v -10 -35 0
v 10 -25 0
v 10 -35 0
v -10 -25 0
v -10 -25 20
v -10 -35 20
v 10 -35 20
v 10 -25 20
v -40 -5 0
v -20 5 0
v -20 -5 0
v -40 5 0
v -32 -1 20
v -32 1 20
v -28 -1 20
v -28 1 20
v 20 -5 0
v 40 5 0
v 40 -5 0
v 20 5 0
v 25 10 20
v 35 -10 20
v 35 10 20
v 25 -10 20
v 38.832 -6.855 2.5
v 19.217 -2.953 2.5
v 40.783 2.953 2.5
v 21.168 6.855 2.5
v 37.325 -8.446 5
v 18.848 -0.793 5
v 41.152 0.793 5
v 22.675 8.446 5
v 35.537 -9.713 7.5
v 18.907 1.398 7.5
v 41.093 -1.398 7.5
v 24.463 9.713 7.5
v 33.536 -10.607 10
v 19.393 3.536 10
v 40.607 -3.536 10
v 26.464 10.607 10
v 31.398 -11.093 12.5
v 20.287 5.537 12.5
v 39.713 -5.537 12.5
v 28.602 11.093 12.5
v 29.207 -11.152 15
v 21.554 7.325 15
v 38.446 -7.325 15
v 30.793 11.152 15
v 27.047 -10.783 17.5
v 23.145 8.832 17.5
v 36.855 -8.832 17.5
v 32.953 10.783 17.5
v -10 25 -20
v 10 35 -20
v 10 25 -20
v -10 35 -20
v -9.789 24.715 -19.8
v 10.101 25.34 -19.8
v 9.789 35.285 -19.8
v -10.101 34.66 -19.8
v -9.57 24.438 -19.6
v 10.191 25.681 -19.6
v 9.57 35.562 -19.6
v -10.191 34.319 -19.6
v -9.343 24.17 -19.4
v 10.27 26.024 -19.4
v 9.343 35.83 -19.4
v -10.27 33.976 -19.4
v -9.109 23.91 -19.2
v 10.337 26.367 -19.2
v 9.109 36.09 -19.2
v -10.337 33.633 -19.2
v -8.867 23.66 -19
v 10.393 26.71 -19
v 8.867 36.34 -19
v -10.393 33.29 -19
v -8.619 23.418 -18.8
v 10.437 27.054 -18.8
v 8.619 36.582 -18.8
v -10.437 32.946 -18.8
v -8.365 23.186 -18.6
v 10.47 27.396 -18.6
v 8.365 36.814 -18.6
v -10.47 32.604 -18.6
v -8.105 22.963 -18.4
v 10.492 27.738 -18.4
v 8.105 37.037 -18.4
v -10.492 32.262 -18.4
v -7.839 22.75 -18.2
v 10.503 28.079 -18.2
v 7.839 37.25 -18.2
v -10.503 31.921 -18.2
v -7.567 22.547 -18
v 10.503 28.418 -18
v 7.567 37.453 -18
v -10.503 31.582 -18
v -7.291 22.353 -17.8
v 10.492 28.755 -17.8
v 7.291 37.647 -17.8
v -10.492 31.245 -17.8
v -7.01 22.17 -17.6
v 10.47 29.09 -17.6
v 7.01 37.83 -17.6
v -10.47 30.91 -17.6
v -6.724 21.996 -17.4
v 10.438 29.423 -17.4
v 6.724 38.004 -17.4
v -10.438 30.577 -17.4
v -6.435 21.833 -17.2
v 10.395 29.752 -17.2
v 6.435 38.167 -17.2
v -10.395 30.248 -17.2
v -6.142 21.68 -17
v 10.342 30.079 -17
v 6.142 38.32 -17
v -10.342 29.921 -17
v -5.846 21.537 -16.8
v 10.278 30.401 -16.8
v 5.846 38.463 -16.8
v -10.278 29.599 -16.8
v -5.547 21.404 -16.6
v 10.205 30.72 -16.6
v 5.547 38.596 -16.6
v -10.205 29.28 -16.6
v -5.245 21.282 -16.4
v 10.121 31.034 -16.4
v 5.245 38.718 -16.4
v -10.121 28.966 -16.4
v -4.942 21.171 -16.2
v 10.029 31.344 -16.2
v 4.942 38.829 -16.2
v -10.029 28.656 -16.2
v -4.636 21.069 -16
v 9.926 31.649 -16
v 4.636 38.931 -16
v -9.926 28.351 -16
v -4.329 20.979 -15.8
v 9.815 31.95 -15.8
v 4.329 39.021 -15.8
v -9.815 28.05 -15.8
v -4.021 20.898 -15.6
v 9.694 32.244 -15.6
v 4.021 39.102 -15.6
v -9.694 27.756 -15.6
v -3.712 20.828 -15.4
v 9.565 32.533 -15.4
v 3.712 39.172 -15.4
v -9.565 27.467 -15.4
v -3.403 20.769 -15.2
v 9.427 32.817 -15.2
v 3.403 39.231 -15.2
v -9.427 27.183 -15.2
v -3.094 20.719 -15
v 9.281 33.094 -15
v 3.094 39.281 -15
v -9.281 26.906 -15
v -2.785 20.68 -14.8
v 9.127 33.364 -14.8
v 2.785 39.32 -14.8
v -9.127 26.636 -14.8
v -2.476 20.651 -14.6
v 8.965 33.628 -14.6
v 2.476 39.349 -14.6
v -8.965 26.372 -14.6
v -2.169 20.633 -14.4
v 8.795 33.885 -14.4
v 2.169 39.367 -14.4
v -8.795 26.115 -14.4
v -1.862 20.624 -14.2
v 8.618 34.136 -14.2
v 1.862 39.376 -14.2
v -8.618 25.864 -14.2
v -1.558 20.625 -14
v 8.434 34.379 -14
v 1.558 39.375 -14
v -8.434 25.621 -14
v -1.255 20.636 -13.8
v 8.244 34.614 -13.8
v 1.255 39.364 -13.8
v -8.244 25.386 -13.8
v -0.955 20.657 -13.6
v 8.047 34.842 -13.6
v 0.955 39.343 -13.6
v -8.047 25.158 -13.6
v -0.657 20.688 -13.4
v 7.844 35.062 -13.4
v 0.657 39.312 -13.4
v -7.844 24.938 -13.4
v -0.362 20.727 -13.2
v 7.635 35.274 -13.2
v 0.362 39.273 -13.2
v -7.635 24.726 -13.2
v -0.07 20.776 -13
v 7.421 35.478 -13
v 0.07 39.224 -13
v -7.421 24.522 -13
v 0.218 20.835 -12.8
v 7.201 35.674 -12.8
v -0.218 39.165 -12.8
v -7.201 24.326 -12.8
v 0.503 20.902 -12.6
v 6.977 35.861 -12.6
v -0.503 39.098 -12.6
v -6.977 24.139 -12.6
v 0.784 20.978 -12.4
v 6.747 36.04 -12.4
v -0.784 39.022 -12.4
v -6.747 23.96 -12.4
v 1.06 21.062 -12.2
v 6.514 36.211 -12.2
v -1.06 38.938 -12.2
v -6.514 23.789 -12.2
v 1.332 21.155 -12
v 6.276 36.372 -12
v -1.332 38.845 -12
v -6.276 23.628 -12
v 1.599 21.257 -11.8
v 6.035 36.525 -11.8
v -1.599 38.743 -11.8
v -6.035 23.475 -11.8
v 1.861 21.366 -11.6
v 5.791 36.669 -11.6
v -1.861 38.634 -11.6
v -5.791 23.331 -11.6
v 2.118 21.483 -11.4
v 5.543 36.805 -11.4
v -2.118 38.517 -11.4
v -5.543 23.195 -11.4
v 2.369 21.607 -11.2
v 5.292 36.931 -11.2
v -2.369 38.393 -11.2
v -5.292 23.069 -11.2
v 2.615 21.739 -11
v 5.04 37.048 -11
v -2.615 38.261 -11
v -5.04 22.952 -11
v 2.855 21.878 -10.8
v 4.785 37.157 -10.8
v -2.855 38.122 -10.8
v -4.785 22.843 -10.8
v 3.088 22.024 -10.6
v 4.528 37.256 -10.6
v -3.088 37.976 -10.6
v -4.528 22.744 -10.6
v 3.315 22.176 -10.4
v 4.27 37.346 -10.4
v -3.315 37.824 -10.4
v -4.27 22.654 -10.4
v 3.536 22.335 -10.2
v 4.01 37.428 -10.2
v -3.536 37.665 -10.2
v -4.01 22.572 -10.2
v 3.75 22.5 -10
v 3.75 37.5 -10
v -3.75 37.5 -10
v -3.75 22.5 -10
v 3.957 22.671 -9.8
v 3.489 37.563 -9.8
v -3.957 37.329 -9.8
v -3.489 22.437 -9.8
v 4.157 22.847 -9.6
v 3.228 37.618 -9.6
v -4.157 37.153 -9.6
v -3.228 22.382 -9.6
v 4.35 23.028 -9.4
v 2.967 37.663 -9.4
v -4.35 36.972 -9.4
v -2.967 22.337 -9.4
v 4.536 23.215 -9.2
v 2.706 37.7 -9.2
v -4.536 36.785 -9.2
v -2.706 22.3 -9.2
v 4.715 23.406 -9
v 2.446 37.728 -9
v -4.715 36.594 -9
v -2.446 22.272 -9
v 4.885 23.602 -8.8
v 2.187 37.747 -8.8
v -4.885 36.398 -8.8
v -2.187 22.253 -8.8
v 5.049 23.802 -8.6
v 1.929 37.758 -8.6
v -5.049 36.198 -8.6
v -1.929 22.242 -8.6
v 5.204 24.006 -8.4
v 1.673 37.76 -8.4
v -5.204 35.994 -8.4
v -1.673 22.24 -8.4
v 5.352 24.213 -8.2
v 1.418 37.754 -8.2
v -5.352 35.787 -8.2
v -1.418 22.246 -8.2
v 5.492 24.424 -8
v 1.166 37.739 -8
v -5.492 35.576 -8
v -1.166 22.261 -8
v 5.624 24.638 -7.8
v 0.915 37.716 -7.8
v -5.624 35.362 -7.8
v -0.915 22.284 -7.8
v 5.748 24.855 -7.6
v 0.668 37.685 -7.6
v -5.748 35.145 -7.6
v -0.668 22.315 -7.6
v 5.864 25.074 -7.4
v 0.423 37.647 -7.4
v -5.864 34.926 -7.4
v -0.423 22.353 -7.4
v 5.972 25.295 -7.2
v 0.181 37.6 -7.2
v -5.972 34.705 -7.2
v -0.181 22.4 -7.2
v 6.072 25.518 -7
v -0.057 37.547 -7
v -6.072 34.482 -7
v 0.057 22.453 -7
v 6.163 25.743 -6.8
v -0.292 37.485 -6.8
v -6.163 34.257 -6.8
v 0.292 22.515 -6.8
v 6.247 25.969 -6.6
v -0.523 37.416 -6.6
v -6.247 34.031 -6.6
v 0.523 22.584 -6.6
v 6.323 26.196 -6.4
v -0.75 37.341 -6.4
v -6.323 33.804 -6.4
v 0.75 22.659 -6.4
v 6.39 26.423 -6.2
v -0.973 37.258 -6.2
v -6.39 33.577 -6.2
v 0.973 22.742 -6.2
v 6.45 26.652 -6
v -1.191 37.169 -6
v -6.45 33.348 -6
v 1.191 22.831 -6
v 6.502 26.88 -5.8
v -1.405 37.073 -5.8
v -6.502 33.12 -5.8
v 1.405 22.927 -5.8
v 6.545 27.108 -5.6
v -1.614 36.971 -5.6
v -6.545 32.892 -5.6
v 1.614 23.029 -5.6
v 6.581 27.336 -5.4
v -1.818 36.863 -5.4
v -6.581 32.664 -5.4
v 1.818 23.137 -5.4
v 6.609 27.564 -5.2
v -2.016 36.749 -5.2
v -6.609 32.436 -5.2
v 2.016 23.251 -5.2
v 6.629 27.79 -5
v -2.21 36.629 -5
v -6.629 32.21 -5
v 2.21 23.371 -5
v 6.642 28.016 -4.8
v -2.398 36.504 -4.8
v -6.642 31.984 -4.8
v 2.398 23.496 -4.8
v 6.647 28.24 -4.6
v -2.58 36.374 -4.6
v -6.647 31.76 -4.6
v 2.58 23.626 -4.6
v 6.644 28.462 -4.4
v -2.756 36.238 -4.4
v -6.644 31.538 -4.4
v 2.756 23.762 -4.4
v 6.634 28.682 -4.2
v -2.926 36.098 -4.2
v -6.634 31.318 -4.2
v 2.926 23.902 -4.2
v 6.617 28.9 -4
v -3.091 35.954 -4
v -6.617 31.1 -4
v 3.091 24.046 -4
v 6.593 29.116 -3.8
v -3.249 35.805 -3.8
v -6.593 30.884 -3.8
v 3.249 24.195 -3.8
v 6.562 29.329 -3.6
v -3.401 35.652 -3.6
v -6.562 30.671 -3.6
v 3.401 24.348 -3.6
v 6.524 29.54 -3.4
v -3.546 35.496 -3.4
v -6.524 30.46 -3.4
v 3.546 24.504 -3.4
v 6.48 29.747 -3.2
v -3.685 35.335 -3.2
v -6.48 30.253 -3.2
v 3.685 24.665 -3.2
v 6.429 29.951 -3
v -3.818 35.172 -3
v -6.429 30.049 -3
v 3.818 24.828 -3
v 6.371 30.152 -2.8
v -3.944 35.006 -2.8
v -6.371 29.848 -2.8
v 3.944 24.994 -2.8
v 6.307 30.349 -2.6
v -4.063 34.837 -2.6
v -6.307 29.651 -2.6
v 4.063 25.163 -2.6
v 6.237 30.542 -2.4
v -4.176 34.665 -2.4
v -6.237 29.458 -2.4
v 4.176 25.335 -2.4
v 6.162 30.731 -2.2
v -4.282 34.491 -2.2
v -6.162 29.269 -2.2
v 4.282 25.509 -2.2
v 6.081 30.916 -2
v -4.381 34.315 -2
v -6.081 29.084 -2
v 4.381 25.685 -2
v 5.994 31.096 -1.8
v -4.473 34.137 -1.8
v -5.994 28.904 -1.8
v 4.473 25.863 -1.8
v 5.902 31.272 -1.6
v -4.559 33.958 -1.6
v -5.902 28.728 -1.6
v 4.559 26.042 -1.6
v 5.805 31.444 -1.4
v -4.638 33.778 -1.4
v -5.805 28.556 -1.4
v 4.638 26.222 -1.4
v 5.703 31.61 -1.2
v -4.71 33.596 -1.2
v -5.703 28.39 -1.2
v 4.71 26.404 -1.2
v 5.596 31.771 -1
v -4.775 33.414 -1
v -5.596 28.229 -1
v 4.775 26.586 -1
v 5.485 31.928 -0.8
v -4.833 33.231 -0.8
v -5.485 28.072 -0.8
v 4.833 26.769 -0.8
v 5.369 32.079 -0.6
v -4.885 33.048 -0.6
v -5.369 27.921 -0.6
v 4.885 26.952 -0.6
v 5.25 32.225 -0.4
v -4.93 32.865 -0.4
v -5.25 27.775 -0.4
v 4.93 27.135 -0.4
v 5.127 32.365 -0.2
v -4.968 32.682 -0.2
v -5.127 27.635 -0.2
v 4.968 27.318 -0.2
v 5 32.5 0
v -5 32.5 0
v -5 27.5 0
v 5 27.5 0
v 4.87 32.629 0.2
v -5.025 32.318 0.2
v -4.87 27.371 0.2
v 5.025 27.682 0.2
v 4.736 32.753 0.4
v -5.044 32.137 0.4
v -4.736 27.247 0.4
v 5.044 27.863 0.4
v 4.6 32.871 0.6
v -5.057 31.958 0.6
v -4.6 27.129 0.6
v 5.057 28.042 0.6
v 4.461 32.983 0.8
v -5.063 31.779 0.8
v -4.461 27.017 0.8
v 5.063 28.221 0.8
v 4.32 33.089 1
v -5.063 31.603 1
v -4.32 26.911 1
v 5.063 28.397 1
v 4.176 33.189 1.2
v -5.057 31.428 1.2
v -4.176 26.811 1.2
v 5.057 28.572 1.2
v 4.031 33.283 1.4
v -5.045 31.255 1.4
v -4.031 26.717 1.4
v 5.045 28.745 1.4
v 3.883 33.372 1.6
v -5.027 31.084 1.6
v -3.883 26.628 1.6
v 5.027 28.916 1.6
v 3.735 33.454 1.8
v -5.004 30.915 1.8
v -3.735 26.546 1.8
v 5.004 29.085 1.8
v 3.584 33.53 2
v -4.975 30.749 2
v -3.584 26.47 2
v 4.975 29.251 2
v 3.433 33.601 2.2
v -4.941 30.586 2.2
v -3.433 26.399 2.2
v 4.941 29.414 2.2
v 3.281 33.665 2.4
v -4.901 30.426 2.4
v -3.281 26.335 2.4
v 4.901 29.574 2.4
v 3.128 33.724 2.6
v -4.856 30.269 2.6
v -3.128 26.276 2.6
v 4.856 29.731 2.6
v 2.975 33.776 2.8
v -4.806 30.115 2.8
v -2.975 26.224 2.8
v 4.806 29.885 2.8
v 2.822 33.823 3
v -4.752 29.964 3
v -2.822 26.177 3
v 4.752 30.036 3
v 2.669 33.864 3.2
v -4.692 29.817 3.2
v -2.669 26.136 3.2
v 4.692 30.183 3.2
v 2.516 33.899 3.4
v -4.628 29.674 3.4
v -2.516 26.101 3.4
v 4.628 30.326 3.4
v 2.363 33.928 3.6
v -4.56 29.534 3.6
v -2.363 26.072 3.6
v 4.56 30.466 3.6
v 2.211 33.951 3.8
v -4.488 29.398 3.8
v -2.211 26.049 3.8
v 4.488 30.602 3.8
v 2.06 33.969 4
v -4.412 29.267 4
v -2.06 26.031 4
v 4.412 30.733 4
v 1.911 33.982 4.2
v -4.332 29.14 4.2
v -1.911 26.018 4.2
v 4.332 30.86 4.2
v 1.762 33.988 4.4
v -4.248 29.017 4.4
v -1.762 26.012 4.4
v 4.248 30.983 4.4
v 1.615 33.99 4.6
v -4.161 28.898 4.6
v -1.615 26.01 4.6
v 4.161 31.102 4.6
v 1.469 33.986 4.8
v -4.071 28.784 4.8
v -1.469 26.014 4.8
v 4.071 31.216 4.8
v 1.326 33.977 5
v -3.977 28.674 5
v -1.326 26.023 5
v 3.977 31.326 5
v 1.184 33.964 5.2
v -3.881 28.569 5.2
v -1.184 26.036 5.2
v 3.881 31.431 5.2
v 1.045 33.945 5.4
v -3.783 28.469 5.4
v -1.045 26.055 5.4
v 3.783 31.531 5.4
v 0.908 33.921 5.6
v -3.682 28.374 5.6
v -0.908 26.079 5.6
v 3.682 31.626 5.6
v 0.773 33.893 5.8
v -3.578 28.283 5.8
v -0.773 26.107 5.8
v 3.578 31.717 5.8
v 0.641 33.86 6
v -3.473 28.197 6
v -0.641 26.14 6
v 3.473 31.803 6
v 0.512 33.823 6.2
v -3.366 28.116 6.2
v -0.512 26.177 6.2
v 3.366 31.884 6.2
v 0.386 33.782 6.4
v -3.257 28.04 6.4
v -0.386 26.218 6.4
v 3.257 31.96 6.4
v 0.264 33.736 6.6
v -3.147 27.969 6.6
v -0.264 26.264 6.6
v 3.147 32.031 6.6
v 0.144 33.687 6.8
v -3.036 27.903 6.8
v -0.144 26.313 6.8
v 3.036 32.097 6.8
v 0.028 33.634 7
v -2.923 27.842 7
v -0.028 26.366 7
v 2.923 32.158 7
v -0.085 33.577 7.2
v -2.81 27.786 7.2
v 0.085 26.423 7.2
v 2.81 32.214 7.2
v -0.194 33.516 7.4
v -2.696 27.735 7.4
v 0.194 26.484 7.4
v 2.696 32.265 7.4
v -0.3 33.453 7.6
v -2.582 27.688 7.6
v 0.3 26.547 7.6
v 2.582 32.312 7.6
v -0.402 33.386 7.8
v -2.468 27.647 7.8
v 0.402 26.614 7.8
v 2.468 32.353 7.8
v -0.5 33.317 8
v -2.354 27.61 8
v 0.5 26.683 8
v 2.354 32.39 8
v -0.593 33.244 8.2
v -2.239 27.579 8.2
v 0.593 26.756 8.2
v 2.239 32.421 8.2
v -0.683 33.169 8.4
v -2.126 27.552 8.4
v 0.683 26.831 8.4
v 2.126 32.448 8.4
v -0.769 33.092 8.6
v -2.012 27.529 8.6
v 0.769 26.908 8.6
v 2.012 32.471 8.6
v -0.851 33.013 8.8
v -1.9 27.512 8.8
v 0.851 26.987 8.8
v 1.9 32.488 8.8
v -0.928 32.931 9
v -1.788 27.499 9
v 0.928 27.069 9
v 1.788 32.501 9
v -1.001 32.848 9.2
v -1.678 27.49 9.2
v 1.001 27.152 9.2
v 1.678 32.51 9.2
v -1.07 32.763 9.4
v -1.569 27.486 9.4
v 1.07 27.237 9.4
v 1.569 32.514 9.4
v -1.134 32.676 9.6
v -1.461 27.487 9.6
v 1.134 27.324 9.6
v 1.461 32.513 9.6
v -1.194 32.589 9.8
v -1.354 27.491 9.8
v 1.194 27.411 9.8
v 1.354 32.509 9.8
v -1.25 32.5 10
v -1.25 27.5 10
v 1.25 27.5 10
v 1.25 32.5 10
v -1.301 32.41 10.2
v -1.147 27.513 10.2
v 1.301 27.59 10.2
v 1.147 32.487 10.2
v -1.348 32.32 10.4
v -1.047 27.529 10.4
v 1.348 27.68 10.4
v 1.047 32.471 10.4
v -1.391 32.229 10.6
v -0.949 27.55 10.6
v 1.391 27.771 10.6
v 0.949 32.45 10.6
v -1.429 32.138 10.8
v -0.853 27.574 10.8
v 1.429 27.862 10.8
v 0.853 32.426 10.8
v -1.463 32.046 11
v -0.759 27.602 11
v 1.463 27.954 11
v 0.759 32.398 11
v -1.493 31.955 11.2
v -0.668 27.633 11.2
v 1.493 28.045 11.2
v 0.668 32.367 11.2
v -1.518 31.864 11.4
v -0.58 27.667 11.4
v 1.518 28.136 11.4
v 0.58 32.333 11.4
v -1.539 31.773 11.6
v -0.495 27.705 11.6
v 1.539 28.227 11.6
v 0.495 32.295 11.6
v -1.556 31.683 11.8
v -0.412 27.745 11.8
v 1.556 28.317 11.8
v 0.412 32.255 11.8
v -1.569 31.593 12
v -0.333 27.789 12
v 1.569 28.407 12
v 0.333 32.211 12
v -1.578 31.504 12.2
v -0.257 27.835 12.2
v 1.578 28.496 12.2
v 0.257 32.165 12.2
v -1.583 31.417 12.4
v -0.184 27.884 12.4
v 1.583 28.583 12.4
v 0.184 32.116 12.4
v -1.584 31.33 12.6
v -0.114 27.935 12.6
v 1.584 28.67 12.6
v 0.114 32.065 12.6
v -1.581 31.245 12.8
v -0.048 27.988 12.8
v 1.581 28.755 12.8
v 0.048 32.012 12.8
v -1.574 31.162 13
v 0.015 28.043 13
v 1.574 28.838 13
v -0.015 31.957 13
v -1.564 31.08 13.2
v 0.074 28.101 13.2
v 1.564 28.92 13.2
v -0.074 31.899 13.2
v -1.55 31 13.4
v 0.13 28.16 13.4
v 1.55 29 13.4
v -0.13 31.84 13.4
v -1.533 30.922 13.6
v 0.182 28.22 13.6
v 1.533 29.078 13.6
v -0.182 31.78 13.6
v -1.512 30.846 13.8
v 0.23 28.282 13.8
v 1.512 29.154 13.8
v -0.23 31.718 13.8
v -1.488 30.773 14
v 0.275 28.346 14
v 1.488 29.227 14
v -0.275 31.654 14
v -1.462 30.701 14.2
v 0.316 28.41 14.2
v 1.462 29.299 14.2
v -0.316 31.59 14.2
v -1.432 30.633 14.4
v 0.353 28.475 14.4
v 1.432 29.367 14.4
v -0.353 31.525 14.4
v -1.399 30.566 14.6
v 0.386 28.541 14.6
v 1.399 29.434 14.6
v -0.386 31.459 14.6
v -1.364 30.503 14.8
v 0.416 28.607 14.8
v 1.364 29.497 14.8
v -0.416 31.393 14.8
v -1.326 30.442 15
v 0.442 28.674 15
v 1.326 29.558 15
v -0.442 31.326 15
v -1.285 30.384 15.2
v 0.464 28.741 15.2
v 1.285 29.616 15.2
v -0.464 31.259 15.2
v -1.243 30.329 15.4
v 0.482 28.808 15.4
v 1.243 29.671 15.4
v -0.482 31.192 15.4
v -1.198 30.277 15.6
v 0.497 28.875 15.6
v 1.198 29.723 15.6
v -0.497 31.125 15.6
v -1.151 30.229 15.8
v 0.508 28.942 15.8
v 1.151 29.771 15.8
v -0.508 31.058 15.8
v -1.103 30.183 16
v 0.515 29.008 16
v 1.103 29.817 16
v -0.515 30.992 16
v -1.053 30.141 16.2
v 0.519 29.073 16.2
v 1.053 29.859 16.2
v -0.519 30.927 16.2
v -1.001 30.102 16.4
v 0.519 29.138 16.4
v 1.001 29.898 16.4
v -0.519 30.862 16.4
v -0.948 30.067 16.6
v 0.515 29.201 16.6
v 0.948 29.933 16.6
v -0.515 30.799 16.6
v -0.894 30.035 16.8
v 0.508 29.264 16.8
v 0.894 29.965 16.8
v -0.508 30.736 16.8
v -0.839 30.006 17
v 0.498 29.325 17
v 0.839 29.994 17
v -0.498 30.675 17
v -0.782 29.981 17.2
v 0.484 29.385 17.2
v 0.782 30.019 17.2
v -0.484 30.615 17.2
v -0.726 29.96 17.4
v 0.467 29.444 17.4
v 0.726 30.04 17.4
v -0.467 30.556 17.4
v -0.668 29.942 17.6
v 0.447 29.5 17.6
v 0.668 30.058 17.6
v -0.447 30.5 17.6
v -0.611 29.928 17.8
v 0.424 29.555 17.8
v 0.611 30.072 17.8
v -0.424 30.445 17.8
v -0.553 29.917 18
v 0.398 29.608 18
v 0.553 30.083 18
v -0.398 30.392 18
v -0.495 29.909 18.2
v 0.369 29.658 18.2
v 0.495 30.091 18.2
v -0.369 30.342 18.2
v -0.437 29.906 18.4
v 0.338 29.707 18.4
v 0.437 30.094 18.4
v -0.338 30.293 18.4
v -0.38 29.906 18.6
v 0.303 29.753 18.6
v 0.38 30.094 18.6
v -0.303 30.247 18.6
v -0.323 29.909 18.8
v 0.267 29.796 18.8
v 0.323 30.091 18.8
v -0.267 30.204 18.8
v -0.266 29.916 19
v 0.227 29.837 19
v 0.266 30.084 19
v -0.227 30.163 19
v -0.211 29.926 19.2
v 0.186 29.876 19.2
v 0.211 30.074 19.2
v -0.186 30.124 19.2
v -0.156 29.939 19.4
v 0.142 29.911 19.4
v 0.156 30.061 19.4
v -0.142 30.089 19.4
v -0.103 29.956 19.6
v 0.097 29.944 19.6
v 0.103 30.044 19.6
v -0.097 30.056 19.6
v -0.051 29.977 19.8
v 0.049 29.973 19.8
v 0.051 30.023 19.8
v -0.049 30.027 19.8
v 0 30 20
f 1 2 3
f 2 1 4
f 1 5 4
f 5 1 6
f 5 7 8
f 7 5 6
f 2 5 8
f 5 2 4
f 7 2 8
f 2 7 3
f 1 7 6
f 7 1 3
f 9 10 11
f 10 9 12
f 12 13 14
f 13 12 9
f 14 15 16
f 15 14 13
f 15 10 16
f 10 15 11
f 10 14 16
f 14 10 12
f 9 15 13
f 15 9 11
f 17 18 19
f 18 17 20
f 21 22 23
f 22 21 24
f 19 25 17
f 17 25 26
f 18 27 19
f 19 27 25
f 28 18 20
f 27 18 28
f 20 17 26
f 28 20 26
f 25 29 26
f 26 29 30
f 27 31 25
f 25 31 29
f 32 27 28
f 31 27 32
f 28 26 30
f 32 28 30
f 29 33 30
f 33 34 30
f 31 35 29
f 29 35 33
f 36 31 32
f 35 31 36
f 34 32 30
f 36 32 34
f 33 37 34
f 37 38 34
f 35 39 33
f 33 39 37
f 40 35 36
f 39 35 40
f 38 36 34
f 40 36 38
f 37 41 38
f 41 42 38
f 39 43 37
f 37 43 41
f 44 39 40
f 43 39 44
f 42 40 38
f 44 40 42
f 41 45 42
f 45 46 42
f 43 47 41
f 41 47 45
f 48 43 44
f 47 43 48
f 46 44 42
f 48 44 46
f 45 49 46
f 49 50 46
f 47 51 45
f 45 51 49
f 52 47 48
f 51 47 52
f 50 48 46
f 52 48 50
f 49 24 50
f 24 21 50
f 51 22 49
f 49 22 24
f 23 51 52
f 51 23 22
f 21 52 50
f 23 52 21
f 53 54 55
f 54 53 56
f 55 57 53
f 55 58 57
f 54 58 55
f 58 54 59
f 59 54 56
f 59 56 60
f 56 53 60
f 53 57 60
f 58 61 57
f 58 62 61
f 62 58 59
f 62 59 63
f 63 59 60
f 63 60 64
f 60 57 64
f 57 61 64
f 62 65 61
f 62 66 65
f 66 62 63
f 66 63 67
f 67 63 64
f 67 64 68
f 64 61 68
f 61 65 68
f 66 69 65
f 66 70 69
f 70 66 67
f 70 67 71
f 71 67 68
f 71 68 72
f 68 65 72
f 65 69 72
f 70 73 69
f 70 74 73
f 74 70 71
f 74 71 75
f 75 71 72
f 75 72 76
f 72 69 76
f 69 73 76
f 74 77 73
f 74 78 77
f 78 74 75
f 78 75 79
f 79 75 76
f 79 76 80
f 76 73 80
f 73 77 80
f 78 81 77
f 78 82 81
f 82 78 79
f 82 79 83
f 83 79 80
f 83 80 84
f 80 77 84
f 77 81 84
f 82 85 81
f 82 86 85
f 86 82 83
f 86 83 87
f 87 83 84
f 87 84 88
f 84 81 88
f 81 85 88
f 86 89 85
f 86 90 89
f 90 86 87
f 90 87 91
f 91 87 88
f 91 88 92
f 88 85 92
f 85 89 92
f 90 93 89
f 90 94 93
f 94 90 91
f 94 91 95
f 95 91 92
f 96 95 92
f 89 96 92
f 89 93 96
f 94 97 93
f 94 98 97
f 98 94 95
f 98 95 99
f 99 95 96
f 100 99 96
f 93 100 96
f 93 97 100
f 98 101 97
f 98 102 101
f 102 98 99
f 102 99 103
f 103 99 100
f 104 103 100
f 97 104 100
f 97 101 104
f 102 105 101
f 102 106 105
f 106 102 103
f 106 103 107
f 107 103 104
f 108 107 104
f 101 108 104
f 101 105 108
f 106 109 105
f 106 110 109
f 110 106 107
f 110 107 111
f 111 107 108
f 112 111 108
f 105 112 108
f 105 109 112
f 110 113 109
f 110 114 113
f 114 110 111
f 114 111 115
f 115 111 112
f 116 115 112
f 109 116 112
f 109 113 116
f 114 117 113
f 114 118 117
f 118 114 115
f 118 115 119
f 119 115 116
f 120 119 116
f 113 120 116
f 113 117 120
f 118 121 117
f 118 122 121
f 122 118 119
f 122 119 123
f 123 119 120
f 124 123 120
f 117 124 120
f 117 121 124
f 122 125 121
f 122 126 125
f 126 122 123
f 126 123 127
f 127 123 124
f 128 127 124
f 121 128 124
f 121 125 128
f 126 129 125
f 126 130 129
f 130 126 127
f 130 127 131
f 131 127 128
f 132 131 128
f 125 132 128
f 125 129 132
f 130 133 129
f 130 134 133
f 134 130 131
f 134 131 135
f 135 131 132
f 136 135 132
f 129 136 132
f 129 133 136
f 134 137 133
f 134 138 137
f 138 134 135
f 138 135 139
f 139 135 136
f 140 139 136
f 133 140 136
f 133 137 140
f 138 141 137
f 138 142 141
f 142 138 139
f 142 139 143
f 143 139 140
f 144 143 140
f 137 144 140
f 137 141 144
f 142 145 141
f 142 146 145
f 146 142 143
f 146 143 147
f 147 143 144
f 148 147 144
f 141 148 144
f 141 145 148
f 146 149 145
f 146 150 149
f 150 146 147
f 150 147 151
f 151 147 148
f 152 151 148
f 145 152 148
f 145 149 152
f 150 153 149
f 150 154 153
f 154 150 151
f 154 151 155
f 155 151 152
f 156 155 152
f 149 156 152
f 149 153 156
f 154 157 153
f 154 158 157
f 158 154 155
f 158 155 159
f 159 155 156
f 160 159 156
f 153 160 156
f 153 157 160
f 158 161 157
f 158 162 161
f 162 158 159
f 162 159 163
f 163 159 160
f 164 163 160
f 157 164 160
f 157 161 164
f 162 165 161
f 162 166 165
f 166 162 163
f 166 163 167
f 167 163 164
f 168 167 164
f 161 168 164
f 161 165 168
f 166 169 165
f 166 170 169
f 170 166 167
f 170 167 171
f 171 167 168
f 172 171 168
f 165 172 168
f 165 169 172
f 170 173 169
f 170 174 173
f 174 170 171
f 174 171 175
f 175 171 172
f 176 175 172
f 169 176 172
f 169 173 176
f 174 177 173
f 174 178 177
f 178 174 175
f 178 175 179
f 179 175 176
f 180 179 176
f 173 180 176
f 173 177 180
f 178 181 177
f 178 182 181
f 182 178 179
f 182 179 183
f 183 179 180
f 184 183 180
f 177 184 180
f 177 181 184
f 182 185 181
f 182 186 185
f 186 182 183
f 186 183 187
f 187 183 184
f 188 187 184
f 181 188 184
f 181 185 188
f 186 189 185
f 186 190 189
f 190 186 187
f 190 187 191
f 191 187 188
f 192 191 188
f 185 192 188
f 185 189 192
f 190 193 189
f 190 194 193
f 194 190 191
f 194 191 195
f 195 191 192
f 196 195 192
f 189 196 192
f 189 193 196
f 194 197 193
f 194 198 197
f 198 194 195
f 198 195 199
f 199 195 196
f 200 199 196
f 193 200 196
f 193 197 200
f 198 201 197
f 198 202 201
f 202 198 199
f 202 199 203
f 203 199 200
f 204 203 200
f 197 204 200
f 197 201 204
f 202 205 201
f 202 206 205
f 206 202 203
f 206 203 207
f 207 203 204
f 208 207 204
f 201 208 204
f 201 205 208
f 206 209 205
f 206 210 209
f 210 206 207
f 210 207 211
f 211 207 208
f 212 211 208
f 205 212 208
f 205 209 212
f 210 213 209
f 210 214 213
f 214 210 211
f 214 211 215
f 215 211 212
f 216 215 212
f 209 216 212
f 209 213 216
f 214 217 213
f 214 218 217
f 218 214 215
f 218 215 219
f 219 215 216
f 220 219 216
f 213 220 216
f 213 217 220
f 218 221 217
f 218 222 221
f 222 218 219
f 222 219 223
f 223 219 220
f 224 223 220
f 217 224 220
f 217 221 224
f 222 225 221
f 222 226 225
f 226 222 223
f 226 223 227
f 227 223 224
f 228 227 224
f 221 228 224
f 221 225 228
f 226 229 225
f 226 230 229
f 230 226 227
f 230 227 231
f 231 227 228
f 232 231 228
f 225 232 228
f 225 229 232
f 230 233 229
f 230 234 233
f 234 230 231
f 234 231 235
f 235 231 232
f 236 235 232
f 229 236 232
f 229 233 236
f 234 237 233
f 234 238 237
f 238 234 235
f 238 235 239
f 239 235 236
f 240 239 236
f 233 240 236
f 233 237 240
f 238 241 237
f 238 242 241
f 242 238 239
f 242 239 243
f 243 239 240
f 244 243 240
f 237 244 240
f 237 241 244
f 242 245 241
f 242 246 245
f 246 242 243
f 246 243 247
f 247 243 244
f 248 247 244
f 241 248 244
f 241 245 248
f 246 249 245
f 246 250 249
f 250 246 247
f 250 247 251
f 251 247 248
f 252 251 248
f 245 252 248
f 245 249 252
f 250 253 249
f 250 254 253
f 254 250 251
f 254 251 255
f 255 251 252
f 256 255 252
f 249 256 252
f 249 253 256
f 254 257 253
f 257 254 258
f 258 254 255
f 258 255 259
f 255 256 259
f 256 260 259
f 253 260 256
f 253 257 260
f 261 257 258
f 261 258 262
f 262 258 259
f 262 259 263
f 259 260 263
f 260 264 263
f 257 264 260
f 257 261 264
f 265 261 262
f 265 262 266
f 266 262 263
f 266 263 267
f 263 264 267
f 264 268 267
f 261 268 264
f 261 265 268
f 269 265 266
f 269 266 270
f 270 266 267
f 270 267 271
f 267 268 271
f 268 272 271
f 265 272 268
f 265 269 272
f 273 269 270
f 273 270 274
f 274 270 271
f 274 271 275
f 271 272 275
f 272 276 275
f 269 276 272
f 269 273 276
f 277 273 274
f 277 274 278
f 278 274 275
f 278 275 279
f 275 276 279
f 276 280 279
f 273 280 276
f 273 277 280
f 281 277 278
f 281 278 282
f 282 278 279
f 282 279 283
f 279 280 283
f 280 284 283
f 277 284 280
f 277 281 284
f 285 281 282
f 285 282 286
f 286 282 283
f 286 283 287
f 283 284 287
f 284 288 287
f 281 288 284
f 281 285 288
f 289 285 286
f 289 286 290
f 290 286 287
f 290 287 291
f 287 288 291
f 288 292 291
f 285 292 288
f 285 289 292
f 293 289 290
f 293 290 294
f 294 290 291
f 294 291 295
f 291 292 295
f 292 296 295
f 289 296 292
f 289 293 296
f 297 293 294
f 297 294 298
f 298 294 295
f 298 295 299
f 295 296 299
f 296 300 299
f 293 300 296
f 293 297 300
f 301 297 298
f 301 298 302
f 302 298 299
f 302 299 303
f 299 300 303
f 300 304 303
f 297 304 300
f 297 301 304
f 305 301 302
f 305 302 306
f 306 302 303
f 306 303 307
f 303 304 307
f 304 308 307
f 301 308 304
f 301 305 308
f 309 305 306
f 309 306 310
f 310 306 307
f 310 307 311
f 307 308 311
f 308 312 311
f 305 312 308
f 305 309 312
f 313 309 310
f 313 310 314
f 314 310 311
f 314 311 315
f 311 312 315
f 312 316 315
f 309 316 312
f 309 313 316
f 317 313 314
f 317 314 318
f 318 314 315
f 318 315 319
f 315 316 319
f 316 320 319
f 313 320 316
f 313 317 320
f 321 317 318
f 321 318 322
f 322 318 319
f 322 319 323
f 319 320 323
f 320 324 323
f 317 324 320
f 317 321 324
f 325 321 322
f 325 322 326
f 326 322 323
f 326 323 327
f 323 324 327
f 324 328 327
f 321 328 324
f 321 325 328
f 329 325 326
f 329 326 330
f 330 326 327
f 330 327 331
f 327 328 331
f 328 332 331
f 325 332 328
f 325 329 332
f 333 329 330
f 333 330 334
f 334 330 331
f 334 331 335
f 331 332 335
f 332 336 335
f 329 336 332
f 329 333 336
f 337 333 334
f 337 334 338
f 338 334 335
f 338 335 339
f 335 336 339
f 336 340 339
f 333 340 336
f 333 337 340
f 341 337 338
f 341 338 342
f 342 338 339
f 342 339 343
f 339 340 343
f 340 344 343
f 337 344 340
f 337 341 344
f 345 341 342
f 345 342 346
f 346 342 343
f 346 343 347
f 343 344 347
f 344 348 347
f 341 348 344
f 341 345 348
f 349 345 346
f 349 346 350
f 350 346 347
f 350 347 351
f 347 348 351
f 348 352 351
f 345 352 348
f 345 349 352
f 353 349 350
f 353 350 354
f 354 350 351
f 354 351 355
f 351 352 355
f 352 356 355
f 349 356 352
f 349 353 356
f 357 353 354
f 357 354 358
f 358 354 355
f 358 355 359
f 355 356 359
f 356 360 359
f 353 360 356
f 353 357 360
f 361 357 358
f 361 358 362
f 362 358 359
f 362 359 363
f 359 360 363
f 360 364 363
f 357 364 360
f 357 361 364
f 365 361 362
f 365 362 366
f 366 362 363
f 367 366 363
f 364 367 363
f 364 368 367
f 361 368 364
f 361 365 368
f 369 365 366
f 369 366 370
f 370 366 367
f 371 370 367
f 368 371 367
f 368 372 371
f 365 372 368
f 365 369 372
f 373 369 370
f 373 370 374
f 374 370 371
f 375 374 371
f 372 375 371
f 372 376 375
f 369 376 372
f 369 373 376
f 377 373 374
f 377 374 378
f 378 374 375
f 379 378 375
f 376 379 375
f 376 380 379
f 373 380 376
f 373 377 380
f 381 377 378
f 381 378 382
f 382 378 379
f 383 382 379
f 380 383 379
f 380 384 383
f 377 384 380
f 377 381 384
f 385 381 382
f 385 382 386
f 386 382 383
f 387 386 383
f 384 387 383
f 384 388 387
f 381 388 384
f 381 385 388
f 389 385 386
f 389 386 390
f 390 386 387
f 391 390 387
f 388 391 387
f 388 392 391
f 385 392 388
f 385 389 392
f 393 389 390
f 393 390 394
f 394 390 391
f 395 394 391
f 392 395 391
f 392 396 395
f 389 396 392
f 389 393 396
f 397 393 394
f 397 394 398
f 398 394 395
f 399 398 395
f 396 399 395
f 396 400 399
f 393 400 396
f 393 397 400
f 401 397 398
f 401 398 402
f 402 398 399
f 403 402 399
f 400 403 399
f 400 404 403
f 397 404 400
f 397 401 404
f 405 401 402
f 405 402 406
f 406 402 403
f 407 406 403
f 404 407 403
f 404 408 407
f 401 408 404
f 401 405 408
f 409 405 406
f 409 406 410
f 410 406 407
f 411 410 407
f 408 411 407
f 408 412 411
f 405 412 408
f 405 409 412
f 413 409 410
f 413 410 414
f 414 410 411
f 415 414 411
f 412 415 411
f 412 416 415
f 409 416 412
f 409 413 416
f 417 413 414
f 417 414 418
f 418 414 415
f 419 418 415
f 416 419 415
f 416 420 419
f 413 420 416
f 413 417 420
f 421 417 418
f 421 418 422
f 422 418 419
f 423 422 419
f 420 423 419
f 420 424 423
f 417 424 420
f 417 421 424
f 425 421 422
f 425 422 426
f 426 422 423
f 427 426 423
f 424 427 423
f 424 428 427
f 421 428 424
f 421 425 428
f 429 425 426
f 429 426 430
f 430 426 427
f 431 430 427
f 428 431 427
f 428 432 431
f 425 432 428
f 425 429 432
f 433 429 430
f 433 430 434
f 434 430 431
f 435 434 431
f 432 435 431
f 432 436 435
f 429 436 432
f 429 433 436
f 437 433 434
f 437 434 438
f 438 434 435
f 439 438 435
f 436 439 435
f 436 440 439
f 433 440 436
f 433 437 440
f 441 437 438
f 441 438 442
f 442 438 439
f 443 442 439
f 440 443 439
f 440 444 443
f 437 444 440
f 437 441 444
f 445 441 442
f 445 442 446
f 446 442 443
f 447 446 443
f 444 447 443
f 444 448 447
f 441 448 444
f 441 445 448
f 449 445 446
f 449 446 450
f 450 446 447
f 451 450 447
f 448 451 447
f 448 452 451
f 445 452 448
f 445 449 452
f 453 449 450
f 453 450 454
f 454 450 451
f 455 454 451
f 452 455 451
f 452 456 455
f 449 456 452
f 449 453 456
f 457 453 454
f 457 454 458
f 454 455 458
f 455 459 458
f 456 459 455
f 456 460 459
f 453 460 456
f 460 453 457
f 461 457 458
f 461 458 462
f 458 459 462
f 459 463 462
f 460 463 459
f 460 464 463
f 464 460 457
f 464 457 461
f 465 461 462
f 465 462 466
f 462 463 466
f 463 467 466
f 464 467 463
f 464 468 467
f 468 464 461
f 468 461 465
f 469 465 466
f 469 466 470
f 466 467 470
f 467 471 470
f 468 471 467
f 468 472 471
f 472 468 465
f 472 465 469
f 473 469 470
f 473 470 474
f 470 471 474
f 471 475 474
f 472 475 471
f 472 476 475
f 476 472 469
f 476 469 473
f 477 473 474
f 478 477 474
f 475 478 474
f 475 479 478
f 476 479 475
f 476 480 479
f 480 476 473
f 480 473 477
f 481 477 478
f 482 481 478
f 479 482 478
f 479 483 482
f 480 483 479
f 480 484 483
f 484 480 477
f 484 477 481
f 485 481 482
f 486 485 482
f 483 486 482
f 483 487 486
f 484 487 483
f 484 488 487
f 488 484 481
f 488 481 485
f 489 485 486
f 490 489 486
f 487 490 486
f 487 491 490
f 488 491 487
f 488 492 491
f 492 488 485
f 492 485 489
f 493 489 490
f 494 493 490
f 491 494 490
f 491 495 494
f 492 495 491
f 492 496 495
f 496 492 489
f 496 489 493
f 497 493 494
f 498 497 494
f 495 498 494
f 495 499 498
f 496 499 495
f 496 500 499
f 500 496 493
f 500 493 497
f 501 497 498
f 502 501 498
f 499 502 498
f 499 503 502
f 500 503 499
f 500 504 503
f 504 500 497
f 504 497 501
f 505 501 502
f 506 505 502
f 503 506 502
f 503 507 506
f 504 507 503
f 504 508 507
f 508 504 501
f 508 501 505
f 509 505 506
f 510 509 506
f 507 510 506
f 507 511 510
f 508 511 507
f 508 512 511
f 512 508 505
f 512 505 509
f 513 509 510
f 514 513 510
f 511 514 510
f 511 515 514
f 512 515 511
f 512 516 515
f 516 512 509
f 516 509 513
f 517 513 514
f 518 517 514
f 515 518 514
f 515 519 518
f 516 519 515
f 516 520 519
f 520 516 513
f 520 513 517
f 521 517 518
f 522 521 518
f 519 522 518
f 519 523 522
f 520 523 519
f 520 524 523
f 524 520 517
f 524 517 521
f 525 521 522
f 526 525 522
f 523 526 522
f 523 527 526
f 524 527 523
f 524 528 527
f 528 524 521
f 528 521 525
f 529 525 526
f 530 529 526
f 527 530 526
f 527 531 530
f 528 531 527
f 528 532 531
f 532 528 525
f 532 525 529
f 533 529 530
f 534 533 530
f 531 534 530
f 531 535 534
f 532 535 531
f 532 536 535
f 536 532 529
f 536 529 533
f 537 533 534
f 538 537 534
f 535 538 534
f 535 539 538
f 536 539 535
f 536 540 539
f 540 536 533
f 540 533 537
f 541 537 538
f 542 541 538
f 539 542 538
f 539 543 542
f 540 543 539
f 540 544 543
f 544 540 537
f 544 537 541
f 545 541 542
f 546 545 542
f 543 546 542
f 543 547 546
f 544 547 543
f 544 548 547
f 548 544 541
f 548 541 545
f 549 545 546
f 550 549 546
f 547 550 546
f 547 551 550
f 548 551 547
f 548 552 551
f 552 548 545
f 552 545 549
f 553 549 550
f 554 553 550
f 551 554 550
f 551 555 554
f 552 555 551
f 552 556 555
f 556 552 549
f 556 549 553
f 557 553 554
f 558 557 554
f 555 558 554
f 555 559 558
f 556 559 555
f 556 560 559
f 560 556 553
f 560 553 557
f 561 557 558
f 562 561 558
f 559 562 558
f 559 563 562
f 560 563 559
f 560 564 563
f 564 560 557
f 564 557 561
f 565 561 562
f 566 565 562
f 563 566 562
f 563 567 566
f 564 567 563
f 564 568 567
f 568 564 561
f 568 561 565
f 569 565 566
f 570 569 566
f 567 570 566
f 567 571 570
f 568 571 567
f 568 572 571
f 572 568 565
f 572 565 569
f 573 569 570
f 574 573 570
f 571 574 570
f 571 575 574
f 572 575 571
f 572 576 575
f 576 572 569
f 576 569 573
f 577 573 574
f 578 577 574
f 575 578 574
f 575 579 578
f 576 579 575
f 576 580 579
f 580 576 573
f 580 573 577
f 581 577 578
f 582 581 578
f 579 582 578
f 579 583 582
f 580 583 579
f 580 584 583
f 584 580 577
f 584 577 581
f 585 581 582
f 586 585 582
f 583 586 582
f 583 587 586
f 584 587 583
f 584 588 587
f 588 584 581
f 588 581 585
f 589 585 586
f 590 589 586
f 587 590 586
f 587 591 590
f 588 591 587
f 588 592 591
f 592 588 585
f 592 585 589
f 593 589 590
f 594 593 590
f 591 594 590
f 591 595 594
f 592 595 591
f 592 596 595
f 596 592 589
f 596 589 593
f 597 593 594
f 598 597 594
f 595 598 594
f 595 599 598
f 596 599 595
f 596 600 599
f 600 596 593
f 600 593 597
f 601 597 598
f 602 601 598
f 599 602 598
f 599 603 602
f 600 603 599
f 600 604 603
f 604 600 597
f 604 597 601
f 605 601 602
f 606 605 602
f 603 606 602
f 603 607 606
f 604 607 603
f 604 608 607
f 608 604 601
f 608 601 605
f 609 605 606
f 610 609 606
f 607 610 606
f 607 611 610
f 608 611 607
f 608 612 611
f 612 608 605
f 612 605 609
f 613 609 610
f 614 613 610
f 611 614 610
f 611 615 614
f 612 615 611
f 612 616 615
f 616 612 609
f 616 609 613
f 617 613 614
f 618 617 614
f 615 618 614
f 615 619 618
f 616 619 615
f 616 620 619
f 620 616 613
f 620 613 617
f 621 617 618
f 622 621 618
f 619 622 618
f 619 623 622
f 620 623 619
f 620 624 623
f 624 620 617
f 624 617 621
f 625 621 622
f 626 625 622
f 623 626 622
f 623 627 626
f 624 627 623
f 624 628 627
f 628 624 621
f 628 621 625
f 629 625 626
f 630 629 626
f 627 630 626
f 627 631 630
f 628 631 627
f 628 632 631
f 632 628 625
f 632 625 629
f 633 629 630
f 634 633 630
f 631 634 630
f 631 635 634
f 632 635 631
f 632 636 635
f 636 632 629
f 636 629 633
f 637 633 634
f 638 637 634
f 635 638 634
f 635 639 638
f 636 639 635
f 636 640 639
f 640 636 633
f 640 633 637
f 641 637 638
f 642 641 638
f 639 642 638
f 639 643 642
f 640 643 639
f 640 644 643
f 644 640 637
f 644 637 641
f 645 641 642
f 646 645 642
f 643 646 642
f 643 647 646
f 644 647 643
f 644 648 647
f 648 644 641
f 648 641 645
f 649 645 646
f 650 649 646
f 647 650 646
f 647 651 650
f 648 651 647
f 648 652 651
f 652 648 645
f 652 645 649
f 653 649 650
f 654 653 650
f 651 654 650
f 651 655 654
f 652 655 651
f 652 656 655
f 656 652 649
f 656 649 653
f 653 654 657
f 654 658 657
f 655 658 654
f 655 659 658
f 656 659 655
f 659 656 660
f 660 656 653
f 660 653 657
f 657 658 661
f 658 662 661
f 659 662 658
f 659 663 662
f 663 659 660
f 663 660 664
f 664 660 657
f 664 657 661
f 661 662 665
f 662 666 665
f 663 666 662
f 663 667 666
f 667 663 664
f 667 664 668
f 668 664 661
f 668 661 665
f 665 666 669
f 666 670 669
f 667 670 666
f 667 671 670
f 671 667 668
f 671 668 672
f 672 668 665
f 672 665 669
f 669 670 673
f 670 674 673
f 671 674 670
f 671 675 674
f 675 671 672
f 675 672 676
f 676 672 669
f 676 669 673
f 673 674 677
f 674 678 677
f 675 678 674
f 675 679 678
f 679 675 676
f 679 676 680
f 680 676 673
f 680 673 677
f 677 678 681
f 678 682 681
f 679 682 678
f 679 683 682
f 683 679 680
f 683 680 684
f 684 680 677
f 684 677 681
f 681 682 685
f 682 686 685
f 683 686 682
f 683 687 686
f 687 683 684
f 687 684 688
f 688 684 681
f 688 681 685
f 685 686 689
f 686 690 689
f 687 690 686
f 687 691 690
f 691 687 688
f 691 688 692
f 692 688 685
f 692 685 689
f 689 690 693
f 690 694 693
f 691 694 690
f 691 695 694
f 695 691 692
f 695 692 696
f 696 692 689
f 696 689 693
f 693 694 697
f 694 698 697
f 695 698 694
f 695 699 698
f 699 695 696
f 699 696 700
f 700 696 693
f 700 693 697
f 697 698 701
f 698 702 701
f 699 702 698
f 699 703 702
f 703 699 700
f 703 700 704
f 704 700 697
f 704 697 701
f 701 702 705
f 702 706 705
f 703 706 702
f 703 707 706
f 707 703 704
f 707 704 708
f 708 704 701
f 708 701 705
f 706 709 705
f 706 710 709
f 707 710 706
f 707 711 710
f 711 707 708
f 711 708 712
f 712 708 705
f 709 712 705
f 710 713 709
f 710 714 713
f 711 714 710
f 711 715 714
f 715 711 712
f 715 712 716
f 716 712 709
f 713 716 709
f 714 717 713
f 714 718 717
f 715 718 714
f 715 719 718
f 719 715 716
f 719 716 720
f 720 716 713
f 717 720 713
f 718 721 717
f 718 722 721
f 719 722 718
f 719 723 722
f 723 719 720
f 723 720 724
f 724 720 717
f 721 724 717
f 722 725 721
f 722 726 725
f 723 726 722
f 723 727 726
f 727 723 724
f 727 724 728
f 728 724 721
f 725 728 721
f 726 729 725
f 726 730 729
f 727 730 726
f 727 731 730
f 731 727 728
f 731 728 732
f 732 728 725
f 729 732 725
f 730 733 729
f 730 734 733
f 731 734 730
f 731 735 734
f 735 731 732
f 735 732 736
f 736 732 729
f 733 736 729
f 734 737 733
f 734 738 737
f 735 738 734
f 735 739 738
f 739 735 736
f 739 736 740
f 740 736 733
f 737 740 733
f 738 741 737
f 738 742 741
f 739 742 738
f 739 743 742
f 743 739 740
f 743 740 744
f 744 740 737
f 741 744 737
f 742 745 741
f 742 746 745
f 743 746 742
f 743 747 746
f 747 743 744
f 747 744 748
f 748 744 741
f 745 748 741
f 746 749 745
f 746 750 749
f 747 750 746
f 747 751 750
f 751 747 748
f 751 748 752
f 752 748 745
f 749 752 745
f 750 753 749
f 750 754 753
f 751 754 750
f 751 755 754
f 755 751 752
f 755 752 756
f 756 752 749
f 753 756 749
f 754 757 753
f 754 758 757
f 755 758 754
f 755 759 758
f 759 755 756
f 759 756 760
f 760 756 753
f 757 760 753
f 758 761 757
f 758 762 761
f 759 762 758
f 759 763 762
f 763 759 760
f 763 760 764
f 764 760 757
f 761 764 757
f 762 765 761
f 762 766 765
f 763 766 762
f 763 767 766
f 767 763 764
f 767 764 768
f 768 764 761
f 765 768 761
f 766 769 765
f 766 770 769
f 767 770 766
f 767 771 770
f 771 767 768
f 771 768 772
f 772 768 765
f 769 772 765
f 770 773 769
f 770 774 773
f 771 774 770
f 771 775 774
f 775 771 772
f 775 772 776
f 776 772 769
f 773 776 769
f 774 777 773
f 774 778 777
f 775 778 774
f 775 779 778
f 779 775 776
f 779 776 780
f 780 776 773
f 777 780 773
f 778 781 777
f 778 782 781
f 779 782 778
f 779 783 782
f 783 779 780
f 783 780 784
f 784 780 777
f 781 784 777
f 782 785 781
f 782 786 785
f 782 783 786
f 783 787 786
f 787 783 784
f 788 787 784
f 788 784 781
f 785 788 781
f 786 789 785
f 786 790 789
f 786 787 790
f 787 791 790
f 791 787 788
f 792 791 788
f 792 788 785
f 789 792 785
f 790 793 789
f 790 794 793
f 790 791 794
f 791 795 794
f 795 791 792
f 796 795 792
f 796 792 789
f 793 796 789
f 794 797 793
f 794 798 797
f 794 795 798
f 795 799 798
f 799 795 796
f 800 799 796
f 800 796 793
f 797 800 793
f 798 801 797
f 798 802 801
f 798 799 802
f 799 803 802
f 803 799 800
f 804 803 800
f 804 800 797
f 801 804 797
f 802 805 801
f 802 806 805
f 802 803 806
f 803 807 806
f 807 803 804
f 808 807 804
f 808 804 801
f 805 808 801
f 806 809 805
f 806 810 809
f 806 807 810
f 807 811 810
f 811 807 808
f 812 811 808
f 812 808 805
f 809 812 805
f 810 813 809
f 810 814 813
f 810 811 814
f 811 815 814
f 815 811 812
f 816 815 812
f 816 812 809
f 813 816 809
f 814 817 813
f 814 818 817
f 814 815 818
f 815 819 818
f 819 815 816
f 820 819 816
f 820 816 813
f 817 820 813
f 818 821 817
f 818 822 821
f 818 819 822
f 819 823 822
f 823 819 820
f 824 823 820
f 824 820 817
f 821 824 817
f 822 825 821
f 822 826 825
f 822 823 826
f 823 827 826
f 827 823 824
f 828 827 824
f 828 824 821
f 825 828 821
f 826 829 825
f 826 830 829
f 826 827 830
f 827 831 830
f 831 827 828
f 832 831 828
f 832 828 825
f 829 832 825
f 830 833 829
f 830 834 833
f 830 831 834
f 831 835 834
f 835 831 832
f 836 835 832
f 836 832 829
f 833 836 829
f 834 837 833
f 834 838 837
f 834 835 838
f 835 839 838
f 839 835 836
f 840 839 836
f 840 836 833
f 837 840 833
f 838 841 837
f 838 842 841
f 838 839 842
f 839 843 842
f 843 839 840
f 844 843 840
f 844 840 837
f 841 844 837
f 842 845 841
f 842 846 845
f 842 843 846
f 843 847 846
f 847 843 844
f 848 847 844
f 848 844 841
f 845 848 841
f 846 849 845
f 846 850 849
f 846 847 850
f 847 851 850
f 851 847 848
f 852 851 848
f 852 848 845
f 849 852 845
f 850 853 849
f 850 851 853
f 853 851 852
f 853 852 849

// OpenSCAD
echo(version=version());

// simple 2D -> 3D extrusion of a rectangle
color("red")
    translate([0, -30, 0])
        linear_extrude(height = 20)
            square([20, 10], center = true);

// using the scale parameter a frustum can be constructed
color("green")
    translate([-30, 0, 0])
        linear_extrude(height = 20, scale = 0.2)
            square([20, 10], center = true);

// with twist the extruded shape will rotate around the Z axis
color("cyan")
    translate([30, 0, 0])
        linear_extrude(height = 20, twist = 90)
            square([20, 10], center = true);

// combining both relatively complex shapes can be created
color("gray")
    translate([0, 30, 0])
        linear_extrude(height = 40, twist = -360, scale = 0, center = true, slices = 200)
            square([20, 10], center = true);

// Written in 2015 by Torsten Paul <Torsten.Paul@gmx.de>
//
// To the extent possible under law, the author(s) have dedicated all
// copyright and related and neighboring rights to this software to the
// public domain worldwide. This software is distributed without any
// warranty.
//
// You should have received a copy of the CC0 Public Domain
// Dedication along with this software.
// If not, see <http://creativecommons.org/publicdomain/zero/1.0/>.
